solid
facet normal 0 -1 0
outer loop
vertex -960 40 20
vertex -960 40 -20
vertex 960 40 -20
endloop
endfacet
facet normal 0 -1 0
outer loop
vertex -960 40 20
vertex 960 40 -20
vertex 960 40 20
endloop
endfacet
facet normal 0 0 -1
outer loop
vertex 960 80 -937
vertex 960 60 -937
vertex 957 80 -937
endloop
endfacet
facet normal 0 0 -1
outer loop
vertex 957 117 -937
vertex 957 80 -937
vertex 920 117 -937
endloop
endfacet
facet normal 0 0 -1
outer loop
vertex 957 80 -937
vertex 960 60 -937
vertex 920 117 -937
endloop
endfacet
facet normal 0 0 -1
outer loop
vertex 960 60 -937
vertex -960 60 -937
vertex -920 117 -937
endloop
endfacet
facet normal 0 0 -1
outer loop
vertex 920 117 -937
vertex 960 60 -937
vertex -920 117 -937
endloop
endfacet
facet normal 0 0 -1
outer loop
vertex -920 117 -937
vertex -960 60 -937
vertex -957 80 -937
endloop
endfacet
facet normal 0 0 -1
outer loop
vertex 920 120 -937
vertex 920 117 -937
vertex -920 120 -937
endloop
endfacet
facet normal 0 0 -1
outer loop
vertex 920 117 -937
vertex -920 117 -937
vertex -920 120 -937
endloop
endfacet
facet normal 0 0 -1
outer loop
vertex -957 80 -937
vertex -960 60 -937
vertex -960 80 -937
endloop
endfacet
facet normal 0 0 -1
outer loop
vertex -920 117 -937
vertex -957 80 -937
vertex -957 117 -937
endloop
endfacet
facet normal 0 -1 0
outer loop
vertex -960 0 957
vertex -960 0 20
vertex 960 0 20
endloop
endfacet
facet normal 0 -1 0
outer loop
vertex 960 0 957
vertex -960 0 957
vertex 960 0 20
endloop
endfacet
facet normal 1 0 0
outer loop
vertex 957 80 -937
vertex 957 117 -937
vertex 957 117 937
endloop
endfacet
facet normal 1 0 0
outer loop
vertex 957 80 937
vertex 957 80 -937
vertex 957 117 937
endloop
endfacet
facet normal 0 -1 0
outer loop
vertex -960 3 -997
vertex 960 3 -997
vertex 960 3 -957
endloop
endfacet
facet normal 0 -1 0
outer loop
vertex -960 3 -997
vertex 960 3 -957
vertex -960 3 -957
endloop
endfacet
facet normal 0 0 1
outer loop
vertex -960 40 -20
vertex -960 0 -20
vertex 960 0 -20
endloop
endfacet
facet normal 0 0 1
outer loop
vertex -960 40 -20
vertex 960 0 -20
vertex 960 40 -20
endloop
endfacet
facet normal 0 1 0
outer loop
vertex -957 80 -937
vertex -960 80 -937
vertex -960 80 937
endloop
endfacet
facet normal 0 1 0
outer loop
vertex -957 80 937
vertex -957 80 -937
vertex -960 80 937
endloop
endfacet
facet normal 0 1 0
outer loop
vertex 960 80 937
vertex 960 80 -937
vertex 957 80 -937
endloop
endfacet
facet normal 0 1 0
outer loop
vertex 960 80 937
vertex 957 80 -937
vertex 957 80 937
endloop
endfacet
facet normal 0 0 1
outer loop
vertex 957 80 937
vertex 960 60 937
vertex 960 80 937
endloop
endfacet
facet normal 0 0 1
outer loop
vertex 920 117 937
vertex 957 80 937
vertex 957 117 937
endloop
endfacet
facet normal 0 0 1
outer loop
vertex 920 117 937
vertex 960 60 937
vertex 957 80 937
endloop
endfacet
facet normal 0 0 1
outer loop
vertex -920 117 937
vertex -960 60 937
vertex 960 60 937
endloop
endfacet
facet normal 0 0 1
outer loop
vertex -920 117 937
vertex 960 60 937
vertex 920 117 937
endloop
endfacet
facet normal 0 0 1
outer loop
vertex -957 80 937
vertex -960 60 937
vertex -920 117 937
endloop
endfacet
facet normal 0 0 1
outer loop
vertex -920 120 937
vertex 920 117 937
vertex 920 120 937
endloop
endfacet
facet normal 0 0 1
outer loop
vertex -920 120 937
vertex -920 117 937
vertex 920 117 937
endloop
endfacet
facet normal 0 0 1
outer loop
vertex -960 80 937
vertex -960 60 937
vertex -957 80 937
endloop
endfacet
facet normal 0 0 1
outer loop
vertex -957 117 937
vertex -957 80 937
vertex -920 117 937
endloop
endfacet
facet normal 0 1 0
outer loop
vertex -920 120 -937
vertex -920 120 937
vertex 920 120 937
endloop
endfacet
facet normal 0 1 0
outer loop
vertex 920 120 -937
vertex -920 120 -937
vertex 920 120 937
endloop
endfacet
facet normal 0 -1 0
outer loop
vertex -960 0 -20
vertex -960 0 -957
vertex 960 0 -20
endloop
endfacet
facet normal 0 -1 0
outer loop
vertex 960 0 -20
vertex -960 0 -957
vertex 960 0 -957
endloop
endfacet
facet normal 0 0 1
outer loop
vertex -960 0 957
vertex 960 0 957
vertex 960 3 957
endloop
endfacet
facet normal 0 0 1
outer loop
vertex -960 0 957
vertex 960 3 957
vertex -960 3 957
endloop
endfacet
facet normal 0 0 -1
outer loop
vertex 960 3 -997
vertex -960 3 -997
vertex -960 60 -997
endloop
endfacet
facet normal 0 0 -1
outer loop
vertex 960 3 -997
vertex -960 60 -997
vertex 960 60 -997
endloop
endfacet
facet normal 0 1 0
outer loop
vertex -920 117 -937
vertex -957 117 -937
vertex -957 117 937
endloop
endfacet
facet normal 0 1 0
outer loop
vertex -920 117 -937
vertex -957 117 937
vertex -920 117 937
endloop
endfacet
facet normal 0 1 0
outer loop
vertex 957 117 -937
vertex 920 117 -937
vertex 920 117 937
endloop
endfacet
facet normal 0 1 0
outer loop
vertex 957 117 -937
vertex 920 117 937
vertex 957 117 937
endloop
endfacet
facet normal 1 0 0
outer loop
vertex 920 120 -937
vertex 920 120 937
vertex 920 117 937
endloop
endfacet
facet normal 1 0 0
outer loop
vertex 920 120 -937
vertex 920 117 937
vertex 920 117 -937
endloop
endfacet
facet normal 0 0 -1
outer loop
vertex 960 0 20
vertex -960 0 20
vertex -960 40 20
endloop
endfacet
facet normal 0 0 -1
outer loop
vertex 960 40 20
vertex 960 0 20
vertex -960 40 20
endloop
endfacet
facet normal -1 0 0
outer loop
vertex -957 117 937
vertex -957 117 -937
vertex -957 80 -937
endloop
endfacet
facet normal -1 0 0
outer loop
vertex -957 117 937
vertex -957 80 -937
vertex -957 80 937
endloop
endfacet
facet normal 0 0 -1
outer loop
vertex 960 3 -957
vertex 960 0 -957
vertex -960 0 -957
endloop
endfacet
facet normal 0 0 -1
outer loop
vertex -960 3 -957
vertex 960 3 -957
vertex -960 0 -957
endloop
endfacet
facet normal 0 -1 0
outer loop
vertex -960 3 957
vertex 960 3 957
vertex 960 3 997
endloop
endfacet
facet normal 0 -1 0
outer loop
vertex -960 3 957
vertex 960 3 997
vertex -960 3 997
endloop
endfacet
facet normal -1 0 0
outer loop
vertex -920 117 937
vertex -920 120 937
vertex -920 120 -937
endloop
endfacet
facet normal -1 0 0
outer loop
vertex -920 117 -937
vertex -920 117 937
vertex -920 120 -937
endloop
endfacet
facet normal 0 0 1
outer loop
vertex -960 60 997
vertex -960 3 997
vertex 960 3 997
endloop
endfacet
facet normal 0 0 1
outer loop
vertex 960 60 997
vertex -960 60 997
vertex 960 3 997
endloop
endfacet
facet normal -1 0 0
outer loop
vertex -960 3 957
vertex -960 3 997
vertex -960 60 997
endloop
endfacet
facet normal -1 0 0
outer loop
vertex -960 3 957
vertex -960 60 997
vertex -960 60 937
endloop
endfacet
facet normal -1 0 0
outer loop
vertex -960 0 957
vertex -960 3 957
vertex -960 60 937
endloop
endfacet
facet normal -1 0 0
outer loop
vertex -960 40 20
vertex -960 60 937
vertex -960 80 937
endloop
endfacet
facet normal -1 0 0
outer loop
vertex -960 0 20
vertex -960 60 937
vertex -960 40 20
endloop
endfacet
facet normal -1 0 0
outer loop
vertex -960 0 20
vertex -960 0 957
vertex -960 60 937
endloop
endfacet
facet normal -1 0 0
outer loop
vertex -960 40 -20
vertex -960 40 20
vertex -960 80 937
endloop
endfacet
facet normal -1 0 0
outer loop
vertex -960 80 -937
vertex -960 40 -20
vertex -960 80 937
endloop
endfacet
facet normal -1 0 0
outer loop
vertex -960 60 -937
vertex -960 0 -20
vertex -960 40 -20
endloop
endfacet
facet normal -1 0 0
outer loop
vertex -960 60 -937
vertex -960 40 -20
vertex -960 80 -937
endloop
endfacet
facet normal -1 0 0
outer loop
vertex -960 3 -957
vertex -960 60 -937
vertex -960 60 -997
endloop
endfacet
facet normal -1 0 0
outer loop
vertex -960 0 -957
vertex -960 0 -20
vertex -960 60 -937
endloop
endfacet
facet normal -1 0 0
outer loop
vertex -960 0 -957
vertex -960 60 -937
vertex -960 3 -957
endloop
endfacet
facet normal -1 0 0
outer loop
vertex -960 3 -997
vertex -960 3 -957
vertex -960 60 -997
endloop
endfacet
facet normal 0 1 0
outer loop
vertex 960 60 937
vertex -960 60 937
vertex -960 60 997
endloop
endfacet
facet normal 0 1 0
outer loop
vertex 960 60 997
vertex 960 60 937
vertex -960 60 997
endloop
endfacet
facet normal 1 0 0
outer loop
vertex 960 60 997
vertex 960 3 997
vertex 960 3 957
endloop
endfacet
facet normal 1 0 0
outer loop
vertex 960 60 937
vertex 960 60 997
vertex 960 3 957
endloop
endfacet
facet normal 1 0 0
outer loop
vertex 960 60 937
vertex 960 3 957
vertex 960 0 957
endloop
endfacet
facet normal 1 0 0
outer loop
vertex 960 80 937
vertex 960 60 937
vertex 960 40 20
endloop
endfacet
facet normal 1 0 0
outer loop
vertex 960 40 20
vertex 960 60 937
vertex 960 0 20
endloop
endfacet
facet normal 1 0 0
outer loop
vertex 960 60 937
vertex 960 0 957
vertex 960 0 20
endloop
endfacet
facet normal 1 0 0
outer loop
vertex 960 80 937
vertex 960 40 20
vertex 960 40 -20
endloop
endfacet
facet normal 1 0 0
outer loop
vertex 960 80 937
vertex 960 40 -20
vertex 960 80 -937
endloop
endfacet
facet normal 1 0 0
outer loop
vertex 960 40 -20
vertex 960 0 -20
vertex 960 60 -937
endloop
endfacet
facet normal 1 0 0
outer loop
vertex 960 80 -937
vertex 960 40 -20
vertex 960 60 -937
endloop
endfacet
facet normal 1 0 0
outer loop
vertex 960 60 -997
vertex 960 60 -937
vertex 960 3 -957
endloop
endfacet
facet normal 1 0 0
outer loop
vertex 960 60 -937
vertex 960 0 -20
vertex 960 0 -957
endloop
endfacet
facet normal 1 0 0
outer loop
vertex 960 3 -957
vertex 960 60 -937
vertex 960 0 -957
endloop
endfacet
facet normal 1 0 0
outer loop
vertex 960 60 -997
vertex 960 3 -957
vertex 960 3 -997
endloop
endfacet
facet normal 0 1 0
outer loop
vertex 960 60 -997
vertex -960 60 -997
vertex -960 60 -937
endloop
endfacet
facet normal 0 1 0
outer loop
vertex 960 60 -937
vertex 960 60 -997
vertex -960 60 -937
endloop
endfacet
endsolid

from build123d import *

# Parameters (mm, degrees)
SKETCH1_W           = 1920
SKETCH1_H           = 1994
BOSS_EXTRUDE1_DEPTH = 120
SKETCH2_W           = 60
SKETCH2_H           = 60
CUT_EXTRUDE1_DEPTH  = 2167.750793239
SKETCH3_W           = 40
SKETCH3_H           = 40
CUT_EXTRUDE2_DEPTH  = 2167.750793239
SKETCH4_W           = 1920
SKETCH4_H           = 40
CUT_EXTRUDE3_DEPTH  = 3
SKETCH5_W           = 40
SKETCH5_H           = 1874
CUT_EXTRUDE4_DEPTH  = 3
SKETCH6_W           = 1874
SKETCH6_H           = 40
CUT_EXTRUDE5_DEPTH  = 3


with BuildPart() as part:
    # Sketch1 → Boss-Extrude1 (new body)
    with BuildSketch(Plane(origin=(0, 0, 0), x_dir=(1, 0, 0), z_dir=(0, 1, 0))):
        Rectangle(SKETCH1_W, SKETCH1_H)
    extrude(amount=BOSS_EXTRUDE1_DEPTH)

    # Sketch2 → Cut-Extrude1 (cut, through all)
    with BuildSketch(Plane.ZY.offset(960)):
        with Locations((-967, 90)):
            Rectangle(SKETCH2_W, SKETCH2_H)
        with Locations((967, 90)):
            Rectangle(SKETCH2_W, SKETCH2_H)
    extrude(amount=-CUT_EXTRUDE1_DEPTH, mode=Mode.SUBTRACT)

    # Sketch3 → Cut-Extrude2 (cut, through all)
    with BuildSketch(Plane.ZY.offset(960)):
        with Locations((0, 20)):
            Rectangle(SKETCH3_W, SKETCH3_H)
    extrude(amount=-CUT_EXTRUDE2_DEPTH, mode=Mode.SUBTRACT)

    # Sketch4 → Cut-Extrude3 (cut)
    with BuildSketch(Plane(origin=(0, 0, 0), x_dir=(-1, 0, 0), z_dir=(0, -1, 0))):
        with Locations((0, 977)):
            Rectangle(SKETCH4_W, SKETCH4_H)
        with Locations((0, -977)):
            Rectangle(SKETCH4_W, SKETCH4_H)
    extrude(amount=-CUT_EXTRUDE3_DEPTH, mode=Mode.SUBTRACT)

    # Sketch5 → Cut-Extrude4 (cut)
    with BuildSketch(Plane(origin=(0, 120, 0), x_dir=(1, 0, 0), z_dir=(0, 1, 0))):
        with Locations((-940, 0)):
            Rectangle(SKETCH5_W, SKETCH5_H)
        with Locations((940, 0)):
            Rectangle(SKETCH5_W, SKETCH5_H)
    extrude(amount=-CUT_EXTRUDE4_DEPTH, mode=Mode.SUBTRACT)

    # Sketch6 → Cut-Extrude5 (cut)
    with BuildSketch(Plane.ZY.offset(960)):
        with Locations((0, 100)):
            Rectangle(SKETCH6_W, SKETCH6_H)
    cut_extrude5 = extrude(amount=-CUT_EXTRUDE5_DEPTH, mode=Mode.SUBTRACT)

    # Mirror1: Cut-Extrude5 across plane
    add(cut_extrude5.mirror(Plane(origin=(0, 0, 0), x_dir=(0, 0, 1), z_dir=(1, 0, 0))), mode=Mode.SUBTRACT)


solid = part.part
